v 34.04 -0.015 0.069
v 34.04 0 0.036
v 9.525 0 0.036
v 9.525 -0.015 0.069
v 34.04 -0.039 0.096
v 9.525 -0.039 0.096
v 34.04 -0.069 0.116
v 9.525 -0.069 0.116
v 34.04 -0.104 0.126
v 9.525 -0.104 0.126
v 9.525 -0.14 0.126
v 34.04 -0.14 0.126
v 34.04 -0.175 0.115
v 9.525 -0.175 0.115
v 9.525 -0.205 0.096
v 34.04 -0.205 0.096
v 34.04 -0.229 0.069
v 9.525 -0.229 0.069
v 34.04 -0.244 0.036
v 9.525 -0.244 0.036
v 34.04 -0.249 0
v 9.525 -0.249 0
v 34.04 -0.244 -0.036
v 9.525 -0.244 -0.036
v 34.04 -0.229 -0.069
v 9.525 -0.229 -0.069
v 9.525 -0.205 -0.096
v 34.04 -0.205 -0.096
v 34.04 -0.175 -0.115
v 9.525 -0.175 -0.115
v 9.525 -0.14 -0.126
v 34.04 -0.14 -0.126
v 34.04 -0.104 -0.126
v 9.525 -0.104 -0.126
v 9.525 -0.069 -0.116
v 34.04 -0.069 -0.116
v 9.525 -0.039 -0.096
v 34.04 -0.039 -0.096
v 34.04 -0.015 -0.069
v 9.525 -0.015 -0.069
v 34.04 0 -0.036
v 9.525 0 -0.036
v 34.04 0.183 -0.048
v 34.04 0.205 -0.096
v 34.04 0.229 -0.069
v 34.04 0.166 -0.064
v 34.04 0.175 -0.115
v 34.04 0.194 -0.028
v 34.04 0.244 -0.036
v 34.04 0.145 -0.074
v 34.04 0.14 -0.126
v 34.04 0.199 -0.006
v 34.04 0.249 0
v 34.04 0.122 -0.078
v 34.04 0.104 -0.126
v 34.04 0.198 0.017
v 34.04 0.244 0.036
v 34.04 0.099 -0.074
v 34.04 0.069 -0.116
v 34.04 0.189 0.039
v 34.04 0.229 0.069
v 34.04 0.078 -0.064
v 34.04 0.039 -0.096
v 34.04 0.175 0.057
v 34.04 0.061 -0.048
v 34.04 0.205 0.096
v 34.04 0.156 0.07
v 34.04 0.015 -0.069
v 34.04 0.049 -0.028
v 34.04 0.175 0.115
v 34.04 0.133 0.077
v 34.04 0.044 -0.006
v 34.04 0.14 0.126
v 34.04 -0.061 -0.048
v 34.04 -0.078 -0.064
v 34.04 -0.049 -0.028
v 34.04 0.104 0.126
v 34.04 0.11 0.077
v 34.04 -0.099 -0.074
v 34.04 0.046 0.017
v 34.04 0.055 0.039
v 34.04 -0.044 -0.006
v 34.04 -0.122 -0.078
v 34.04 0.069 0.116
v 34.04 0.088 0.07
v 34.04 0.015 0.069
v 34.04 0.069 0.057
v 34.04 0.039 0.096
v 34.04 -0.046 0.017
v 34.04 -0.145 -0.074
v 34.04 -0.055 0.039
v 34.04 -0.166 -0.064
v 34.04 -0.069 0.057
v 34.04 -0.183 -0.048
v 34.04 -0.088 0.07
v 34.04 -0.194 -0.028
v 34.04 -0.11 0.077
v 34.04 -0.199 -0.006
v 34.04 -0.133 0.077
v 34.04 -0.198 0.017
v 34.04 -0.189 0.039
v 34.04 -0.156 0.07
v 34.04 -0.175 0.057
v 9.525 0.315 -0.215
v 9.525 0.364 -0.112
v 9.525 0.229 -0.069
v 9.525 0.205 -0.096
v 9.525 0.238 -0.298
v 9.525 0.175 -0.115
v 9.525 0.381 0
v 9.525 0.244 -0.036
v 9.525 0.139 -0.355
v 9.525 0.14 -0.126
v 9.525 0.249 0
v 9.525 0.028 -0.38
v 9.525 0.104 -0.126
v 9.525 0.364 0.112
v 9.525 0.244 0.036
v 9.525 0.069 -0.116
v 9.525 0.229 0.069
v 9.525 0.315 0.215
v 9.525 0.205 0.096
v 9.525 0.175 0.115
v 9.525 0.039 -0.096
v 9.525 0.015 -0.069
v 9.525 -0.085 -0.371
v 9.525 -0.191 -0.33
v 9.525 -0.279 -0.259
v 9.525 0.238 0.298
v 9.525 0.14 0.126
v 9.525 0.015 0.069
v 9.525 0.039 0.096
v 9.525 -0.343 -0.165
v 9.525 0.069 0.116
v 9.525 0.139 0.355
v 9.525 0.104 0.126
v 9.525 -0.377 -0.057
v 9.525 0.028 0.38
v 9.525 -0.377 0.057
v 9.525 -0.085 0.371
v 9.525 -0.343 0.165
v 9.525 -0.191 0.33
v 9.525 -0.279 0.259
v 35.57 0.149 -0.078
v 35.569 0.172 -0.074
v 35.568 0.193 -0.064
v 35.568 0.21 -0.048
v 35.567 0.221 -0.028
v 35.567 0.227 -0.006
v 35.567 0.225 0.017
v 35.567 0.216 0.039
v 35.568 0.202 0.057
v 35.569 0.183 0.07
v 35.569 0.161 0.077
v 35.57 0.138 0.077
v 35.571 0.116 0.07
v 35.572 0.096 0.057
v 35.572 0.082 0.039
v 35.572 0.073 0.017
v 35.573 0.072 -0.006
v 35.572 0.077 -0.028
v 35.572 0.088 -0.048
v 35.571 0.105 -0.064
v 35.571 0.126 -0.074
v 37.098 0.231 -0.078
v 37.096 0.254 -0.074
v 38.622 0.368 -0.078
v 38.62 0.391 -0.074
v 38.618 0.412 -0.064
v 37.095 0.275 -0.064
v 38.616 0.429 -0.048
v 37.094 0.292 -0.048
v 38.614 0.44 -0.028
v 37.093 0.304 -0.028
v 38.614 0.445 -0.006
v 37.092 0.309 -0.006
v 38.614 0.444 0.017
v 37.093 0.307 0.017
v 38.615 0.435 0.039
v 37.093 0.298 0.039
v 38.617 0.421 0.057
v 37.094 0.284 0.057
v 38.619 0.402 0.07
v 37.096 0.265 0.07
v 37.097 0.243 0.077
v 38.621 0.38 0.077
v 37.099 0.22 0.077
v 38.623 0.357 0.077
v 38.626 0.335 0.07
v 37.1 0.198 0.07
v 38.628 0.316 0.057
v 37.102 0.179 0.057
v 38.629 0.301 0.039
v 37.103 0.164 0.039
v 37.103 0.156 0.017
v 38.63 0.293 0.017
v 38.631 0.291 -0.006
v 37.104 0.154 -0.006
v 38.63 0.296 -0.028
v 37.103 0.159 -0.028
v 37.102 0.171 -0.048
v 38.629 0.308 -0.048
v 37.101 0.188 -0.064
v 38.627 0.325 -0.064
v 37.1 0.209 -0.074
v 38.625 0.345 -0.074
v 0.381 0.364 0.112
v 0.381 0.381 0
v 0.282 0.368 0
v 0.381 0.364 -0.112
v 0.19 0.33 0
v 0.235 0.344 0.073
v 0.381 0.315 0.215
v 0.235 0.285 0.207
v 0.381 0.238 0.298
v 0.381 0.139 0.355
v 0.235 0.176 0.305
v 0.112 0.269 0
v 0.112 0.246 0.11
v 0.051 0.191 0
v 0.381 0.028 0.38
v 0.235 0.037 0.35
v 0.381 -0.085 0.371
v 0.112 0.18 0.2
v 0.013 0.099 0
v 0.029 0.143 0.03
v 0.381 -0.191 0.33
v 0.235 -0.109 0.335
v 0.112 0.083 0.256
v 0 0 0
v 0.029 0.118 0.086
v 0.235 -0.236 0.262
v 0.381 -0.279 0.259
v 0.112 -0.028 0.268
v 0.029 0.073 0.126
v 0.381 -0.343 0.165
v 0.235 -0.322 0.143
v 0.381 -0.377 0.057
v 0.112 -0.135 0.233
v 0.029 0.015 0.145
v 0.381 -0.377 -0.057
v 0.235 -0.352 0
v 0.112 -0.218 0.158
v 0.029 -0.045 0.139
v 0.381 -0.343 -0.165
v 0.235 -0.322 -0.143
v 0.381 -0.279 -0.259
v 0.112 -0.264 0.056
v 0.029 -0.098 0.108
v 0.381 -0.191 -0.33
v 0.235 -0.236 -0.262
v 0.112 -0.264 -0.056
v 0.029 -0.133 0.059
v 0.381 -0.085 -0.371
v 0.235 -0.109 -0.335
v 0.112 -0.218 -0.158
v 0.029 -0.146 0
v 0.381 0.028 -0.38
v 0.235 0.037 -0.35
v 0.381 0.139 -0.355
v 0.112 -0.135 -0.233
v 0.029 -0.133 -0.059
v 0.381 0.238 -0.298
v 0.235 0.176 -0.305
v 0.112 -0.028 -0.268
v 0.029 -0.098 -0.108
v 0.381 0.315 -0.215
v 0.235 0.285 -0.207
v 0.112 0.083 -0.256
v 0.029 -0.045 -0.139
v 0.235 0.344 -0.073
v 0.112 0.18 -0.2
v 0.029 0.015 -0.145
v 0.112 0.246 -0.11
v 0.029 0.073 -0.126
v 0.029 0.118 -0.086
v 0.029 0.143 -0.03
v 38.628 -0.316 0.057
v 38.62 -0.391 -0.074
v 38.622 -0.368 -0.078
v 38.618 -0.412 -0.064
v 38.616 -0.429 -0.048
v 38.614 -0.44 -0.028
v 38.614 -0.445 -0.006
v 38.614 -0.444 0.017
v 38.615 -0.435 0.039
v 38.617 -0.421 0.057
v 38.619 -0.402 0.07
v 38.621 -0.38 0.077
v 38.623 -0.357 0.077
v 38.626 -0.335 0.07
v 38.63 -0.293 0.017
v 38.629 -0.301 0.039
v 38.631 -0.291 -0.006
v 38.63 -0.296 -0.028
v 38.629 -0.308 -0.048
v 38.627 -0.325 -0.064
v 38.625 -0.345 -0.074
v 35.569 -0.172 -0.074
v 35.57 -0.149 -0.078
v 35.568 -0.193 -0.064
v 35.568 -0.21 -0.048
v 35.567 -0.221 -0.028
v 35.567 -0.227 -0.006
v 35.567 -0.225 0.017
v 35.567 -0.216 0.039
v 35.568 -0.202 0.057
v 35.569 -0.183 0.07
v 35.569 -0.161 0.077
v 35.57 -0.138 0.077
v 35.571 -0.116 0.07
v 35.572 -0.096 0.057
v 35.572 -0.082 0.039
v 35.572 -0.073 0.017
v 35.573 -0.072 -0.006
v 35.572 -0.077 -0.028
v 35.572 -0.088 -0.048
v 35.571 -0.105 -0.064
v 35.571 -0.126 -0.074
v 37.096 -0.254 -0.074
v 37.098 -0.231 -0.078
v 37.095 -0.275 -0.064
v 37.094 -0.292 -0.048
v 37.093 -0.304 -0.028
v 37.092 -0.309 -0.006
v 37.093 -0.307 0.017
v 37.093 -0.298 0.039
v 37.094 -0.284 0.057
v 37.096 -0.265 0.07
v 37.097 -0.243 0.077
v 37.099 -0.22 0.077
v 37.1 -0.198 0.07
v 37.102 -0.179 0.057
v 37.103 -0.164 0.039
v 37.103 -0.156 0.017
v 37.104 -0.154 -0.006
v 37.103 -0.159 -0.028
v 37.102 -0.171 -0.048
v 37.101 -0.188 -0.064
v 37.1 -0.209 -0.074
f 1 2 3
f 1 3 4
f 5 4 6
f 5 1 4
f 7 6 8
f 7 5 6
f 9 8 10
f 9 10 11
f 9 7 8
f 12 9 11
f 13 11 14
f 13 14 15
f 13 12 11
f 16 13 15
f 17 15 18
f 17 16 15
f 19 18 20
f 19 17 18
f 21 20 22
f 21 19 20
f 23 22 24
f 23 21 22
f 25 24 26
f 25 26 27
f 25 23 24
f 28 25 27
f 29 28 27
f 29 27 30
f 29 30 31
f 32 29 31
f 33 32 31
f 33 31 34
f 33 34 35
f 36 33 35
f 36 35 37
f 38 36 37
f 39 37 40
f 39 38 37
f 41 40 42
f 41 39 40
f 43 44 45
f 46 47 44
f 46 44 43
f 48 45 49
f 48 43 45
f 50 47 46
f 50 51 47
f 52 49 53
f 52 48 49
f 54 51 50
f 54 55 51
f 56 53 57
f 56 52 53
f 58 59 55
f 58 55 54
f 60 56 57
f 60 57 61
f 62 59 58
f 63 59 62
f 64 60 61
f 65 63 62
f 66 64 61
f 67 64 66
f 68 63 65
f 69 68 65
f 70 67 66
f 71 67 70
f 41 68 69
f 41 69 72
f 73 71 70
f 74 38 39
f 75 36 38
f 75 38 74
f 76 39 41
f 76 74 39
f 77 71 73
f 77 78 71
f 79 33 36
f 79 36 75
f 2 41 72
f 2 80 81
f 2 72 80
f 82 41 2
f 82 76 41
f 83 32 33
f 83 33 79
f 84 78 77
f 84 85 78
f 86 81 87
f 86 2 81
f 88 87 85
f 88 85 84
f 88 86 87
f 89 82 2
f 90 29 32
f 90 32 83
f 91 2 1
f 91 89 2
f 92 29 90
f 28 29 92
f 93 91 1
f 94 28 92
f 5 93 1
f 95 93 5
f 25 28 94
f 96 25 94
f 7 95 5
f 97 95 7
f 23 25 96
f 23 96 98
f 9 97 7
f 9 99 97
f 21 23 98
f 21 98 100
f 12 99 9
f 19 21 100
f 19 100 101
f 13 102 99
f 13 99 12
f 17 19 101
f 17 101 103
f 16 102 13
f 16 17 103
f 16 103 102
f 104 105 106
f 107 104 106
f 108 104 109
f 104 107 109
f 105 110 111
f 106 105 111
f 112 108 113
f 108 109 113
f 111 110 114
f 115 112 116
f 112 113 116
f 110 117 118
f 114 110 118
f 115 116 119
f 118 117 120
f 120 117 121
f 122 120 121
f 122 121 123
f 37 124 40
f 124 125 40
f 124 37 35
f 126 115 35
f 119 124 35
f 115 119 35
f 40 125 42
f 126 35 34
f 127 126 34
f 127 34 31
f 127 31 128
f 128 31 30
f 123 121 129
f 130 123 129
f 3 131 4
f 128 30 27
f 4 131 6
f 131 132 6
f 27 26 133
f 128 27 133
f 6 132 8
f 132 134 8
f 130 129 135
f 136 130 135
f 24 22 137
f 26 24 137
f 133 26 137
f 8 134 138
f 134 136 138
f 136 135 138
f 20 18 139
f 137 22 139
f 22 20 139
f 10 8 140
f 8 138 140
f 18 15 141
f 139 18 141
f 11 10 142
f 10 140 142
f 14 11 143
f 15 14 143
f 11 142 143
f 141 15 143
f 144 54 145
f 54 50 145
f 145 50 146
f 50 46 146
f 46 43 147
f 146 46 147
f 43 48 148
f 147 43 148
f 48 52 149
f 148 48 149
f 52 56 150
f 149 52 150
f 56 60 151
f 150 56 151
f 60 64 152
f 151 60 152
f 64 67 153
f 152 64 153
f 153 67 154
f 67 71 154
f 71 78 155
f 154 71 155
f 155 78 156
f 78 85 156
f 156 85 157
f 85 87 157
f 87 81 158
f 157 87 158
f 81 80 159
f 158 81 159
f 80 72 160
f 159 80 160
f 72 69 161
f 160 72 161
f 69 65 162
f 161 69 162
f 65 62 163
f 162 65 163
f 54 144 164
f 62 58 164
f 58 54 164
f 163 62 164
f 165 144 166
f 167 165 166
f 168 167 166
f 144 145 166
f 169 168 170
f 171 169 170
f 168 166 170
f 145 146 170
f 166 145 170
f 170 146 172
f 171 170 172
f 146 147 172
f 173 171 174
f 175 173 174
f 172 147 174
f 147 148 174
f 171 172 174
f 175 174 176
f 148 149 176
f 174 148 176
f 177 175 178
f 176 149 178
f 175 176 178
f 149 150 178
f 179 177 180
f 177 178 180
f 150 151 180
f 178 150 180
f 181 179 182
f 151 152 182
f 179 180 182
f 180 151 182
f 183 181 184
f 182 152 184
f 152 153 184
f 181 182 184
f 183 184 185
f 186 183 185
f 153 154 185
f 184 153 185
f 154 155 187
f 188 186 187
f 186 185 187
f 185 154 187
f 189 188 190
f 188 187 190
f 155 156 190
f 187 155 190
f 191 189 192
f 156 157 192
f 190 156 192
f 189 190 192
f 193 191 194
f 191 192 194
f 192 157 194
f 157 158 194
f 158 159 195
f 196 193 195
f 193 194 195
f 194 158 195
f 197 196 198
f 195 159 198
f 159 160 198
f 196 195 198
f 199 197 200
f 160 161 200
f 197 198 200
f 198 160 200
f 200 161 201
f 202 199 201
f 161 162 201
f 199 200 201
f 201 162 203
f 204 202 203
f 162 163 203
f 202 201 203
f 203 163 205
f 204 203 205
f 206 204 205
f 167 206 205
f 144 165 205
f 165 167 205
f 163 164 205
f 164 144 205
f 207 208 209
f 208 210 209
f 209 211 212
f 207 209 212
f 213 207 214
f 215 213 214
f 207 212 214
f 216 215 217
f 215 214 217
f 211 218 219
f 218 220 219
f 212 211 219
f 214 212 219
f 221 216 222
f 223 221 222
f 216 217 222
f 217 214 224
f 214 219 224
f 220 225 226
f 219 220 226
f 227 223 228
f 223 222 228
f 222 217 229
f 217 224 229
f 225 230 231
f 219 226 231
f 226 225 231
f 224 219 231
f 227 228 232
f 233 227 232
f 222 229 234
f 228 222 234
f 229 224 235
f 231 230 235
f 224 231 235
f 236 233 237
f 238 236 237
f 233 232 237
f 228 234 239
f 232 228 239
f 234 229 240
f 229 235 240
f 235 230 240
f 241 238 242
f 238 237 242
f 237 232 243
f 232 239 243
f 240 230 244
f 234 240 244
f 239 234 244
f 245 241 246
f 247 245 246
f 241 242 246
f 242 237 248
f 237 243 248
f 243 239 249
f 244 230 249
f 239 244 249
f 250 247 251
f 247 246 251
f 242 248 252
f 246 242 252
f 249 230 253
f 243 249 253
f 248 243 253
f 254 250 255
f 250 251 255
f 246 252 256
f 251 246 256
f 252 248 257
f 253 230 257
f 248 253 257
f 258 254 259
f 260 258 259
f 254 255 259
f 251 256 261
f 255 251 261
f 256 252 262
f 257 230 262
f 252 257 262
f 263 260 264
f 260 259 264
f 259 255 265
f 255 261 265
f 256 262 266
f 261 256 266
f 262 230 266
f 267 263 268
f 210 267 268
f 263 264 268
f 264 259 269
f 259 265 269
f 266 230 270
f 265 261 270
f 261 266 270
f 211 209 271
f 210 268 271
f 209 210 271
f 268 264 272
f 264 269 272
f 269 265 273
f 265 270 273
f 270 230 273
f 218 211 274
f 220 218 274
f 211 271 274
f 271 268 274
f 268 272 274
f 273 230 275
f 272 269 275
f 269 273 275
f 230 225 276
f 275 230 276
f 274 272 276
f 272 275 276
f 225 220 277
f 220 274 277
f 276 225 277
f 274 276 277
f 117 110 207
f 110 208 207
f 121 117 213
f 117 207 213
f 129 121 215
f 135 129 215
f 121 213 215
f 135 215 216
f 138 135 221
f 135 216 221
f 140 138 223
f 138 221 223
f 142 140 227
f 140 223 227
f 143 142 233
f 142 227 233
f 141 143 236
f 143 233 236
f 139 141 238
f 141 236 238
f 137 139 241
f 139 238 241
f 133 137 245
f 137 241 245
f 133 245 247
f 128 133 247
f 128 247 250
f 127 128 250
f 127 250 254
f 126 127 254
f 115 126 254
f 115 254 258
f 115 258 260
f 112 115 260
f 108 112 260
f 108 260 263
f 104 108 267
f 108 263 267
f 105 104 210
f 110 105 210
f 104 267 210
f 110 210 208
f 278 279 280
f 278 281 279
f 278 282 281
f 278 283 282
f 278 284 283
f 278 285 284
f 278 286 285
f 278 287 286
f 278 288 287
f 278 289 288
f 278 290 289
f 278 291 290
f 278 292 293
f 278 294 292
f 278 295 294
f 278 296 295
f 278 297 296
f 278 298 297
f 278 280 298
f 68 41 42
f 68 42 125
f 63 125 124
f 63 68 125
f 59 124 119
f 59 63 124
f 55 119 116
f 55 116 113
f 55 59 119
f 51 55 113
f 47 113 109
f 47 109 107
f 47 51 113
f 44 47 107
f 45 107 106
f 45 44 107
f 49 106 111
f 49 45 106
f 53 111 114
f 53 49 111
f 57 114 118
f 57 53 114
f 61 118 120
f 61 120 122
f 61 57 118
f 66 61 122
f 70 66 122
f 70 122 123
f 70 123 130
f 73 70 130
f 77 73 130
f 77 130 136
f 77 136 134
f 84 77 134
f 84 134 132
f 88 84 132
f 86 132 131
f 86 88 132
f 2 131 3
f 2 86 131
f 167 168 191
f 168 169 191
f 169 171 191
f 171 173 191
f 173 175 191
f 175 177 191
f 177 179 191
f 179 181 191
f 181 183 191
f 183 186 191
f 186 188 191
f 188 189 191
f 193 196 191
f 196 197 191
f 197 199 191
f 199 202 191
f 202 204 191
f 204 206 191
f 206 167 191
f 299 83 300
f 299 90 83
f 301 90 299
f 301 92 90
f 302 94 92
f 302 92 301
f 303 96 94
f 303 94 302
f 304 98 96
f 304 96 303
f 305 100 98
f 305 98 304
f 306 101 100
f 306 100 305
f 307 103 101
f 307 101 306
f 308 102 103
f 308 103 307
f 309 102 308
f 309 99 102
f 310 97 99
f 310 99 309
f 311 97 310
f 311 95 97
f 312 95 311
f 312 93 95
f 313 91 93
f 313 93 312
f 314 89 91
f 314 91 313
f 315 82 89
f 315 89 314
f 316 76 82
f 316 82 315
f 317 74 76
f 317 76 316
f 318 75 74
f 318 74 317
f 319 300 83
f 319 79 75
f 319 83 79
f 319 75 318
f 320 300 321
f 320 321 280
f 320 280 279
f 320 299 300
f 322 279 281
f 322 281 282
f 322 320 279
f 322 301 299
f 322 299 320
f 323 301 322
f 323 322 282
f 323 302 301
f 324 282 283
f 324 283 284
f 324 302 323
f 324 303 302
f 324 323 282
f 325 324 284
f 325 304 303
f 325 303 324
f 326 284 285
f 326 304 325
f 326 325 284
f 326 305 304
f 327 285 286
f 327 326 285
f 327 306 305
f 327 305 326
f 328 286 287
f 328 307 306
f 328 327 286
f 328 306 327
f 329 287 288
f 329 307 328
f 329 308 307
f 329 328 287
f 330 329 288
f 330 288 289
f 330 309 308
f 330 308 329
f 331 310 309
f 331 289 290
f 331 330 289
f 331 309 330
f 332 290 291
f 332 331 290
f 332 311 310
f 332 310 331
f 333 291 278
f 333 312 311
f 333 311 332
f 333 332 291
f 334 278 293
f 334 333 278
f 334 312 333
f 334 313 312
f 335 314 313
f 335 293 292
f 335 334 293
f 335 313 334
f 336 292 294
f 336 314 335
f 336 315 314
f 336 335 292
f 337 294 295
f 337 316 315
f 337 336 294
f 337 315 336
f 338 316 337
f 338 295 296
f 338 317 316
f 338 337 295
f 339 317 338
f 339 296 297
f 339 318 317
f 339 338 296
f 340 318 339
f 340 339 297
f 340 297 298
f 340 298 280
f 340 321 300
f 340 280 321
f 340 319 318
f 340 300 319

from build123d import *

# Parameters (mm, degrees)
SKETCH4_R = 0.077706682


with BuildPart() as part:
    # Sketch1 → Revolve1 (revolve)
    with BuildSketch(Plane.XY):
        with BuildLine():
            Line((0, 0), (9.525, 0))
            Line((9.525, 0), (9.525, 0.381))
            Line((9.525, 0.381), (0.381, 0.381))
            ThreePointArc((0.381, 0.381), (0.111592316, 0.269407684), (0, 0))
        make_face()
    revolve(axis=Axis((0, 0, 0), (1, 0, 0)))

    # Sweep1: sweep along a path in Sketch3
    with BuildLine(Plane(origin=(0, 0, 0), x_dir=(1, 0, 0), z_dir=(0, 1, 0))) as sweep1_path:
        Line((9.525, 0), (9.667412836, 0))
        Line((9.667412836, 0), (9.860608845, 0))
        Line((9.860608845, 0), (34.039598504, 0))
    # Sketch2 → Sweep1 (sweep)
    with BuildSketch(Plane(origin=(9.525, 0, 0), x_dir=(0, 0, -1), z_dir=(1, 0, 0))):
        with BuildLine():
            ThreePointArc((0.035971282, 0), (0, 0.248799289), (-0.035971282, 0))
            ThreePointArc((-0.035971282, 0), (0, -0.248799289), (0.035971282, 0))
        make_face()
    sweep(path=sweep1_path.line)

    # Sweep2: sweep along a path in Sketch5
    with BuildLine(Plane.XY) as sweep2_path:
        ThreePointArc((34.039598504, -0.121799289), (36.334226152, -0.183442101), (38.622234694, -0.368192721))
    # Sketch4 → Sweep2 (sweep)
    with BuildSketch(Plane(origin=(34.039598504, 0, 0), x_dir=(0, 0, -1), z_dir=(1, 0, 0))):
        with Locations((0, -0.121799289)):
            Circle(SKETCH4_R)
    sweep2 = sweep(path=sweep2_path.line)

    # Mirror1: Sweep2 across plane
    add(sweep2.mirror(Plane.ZX))


solid = part.part
